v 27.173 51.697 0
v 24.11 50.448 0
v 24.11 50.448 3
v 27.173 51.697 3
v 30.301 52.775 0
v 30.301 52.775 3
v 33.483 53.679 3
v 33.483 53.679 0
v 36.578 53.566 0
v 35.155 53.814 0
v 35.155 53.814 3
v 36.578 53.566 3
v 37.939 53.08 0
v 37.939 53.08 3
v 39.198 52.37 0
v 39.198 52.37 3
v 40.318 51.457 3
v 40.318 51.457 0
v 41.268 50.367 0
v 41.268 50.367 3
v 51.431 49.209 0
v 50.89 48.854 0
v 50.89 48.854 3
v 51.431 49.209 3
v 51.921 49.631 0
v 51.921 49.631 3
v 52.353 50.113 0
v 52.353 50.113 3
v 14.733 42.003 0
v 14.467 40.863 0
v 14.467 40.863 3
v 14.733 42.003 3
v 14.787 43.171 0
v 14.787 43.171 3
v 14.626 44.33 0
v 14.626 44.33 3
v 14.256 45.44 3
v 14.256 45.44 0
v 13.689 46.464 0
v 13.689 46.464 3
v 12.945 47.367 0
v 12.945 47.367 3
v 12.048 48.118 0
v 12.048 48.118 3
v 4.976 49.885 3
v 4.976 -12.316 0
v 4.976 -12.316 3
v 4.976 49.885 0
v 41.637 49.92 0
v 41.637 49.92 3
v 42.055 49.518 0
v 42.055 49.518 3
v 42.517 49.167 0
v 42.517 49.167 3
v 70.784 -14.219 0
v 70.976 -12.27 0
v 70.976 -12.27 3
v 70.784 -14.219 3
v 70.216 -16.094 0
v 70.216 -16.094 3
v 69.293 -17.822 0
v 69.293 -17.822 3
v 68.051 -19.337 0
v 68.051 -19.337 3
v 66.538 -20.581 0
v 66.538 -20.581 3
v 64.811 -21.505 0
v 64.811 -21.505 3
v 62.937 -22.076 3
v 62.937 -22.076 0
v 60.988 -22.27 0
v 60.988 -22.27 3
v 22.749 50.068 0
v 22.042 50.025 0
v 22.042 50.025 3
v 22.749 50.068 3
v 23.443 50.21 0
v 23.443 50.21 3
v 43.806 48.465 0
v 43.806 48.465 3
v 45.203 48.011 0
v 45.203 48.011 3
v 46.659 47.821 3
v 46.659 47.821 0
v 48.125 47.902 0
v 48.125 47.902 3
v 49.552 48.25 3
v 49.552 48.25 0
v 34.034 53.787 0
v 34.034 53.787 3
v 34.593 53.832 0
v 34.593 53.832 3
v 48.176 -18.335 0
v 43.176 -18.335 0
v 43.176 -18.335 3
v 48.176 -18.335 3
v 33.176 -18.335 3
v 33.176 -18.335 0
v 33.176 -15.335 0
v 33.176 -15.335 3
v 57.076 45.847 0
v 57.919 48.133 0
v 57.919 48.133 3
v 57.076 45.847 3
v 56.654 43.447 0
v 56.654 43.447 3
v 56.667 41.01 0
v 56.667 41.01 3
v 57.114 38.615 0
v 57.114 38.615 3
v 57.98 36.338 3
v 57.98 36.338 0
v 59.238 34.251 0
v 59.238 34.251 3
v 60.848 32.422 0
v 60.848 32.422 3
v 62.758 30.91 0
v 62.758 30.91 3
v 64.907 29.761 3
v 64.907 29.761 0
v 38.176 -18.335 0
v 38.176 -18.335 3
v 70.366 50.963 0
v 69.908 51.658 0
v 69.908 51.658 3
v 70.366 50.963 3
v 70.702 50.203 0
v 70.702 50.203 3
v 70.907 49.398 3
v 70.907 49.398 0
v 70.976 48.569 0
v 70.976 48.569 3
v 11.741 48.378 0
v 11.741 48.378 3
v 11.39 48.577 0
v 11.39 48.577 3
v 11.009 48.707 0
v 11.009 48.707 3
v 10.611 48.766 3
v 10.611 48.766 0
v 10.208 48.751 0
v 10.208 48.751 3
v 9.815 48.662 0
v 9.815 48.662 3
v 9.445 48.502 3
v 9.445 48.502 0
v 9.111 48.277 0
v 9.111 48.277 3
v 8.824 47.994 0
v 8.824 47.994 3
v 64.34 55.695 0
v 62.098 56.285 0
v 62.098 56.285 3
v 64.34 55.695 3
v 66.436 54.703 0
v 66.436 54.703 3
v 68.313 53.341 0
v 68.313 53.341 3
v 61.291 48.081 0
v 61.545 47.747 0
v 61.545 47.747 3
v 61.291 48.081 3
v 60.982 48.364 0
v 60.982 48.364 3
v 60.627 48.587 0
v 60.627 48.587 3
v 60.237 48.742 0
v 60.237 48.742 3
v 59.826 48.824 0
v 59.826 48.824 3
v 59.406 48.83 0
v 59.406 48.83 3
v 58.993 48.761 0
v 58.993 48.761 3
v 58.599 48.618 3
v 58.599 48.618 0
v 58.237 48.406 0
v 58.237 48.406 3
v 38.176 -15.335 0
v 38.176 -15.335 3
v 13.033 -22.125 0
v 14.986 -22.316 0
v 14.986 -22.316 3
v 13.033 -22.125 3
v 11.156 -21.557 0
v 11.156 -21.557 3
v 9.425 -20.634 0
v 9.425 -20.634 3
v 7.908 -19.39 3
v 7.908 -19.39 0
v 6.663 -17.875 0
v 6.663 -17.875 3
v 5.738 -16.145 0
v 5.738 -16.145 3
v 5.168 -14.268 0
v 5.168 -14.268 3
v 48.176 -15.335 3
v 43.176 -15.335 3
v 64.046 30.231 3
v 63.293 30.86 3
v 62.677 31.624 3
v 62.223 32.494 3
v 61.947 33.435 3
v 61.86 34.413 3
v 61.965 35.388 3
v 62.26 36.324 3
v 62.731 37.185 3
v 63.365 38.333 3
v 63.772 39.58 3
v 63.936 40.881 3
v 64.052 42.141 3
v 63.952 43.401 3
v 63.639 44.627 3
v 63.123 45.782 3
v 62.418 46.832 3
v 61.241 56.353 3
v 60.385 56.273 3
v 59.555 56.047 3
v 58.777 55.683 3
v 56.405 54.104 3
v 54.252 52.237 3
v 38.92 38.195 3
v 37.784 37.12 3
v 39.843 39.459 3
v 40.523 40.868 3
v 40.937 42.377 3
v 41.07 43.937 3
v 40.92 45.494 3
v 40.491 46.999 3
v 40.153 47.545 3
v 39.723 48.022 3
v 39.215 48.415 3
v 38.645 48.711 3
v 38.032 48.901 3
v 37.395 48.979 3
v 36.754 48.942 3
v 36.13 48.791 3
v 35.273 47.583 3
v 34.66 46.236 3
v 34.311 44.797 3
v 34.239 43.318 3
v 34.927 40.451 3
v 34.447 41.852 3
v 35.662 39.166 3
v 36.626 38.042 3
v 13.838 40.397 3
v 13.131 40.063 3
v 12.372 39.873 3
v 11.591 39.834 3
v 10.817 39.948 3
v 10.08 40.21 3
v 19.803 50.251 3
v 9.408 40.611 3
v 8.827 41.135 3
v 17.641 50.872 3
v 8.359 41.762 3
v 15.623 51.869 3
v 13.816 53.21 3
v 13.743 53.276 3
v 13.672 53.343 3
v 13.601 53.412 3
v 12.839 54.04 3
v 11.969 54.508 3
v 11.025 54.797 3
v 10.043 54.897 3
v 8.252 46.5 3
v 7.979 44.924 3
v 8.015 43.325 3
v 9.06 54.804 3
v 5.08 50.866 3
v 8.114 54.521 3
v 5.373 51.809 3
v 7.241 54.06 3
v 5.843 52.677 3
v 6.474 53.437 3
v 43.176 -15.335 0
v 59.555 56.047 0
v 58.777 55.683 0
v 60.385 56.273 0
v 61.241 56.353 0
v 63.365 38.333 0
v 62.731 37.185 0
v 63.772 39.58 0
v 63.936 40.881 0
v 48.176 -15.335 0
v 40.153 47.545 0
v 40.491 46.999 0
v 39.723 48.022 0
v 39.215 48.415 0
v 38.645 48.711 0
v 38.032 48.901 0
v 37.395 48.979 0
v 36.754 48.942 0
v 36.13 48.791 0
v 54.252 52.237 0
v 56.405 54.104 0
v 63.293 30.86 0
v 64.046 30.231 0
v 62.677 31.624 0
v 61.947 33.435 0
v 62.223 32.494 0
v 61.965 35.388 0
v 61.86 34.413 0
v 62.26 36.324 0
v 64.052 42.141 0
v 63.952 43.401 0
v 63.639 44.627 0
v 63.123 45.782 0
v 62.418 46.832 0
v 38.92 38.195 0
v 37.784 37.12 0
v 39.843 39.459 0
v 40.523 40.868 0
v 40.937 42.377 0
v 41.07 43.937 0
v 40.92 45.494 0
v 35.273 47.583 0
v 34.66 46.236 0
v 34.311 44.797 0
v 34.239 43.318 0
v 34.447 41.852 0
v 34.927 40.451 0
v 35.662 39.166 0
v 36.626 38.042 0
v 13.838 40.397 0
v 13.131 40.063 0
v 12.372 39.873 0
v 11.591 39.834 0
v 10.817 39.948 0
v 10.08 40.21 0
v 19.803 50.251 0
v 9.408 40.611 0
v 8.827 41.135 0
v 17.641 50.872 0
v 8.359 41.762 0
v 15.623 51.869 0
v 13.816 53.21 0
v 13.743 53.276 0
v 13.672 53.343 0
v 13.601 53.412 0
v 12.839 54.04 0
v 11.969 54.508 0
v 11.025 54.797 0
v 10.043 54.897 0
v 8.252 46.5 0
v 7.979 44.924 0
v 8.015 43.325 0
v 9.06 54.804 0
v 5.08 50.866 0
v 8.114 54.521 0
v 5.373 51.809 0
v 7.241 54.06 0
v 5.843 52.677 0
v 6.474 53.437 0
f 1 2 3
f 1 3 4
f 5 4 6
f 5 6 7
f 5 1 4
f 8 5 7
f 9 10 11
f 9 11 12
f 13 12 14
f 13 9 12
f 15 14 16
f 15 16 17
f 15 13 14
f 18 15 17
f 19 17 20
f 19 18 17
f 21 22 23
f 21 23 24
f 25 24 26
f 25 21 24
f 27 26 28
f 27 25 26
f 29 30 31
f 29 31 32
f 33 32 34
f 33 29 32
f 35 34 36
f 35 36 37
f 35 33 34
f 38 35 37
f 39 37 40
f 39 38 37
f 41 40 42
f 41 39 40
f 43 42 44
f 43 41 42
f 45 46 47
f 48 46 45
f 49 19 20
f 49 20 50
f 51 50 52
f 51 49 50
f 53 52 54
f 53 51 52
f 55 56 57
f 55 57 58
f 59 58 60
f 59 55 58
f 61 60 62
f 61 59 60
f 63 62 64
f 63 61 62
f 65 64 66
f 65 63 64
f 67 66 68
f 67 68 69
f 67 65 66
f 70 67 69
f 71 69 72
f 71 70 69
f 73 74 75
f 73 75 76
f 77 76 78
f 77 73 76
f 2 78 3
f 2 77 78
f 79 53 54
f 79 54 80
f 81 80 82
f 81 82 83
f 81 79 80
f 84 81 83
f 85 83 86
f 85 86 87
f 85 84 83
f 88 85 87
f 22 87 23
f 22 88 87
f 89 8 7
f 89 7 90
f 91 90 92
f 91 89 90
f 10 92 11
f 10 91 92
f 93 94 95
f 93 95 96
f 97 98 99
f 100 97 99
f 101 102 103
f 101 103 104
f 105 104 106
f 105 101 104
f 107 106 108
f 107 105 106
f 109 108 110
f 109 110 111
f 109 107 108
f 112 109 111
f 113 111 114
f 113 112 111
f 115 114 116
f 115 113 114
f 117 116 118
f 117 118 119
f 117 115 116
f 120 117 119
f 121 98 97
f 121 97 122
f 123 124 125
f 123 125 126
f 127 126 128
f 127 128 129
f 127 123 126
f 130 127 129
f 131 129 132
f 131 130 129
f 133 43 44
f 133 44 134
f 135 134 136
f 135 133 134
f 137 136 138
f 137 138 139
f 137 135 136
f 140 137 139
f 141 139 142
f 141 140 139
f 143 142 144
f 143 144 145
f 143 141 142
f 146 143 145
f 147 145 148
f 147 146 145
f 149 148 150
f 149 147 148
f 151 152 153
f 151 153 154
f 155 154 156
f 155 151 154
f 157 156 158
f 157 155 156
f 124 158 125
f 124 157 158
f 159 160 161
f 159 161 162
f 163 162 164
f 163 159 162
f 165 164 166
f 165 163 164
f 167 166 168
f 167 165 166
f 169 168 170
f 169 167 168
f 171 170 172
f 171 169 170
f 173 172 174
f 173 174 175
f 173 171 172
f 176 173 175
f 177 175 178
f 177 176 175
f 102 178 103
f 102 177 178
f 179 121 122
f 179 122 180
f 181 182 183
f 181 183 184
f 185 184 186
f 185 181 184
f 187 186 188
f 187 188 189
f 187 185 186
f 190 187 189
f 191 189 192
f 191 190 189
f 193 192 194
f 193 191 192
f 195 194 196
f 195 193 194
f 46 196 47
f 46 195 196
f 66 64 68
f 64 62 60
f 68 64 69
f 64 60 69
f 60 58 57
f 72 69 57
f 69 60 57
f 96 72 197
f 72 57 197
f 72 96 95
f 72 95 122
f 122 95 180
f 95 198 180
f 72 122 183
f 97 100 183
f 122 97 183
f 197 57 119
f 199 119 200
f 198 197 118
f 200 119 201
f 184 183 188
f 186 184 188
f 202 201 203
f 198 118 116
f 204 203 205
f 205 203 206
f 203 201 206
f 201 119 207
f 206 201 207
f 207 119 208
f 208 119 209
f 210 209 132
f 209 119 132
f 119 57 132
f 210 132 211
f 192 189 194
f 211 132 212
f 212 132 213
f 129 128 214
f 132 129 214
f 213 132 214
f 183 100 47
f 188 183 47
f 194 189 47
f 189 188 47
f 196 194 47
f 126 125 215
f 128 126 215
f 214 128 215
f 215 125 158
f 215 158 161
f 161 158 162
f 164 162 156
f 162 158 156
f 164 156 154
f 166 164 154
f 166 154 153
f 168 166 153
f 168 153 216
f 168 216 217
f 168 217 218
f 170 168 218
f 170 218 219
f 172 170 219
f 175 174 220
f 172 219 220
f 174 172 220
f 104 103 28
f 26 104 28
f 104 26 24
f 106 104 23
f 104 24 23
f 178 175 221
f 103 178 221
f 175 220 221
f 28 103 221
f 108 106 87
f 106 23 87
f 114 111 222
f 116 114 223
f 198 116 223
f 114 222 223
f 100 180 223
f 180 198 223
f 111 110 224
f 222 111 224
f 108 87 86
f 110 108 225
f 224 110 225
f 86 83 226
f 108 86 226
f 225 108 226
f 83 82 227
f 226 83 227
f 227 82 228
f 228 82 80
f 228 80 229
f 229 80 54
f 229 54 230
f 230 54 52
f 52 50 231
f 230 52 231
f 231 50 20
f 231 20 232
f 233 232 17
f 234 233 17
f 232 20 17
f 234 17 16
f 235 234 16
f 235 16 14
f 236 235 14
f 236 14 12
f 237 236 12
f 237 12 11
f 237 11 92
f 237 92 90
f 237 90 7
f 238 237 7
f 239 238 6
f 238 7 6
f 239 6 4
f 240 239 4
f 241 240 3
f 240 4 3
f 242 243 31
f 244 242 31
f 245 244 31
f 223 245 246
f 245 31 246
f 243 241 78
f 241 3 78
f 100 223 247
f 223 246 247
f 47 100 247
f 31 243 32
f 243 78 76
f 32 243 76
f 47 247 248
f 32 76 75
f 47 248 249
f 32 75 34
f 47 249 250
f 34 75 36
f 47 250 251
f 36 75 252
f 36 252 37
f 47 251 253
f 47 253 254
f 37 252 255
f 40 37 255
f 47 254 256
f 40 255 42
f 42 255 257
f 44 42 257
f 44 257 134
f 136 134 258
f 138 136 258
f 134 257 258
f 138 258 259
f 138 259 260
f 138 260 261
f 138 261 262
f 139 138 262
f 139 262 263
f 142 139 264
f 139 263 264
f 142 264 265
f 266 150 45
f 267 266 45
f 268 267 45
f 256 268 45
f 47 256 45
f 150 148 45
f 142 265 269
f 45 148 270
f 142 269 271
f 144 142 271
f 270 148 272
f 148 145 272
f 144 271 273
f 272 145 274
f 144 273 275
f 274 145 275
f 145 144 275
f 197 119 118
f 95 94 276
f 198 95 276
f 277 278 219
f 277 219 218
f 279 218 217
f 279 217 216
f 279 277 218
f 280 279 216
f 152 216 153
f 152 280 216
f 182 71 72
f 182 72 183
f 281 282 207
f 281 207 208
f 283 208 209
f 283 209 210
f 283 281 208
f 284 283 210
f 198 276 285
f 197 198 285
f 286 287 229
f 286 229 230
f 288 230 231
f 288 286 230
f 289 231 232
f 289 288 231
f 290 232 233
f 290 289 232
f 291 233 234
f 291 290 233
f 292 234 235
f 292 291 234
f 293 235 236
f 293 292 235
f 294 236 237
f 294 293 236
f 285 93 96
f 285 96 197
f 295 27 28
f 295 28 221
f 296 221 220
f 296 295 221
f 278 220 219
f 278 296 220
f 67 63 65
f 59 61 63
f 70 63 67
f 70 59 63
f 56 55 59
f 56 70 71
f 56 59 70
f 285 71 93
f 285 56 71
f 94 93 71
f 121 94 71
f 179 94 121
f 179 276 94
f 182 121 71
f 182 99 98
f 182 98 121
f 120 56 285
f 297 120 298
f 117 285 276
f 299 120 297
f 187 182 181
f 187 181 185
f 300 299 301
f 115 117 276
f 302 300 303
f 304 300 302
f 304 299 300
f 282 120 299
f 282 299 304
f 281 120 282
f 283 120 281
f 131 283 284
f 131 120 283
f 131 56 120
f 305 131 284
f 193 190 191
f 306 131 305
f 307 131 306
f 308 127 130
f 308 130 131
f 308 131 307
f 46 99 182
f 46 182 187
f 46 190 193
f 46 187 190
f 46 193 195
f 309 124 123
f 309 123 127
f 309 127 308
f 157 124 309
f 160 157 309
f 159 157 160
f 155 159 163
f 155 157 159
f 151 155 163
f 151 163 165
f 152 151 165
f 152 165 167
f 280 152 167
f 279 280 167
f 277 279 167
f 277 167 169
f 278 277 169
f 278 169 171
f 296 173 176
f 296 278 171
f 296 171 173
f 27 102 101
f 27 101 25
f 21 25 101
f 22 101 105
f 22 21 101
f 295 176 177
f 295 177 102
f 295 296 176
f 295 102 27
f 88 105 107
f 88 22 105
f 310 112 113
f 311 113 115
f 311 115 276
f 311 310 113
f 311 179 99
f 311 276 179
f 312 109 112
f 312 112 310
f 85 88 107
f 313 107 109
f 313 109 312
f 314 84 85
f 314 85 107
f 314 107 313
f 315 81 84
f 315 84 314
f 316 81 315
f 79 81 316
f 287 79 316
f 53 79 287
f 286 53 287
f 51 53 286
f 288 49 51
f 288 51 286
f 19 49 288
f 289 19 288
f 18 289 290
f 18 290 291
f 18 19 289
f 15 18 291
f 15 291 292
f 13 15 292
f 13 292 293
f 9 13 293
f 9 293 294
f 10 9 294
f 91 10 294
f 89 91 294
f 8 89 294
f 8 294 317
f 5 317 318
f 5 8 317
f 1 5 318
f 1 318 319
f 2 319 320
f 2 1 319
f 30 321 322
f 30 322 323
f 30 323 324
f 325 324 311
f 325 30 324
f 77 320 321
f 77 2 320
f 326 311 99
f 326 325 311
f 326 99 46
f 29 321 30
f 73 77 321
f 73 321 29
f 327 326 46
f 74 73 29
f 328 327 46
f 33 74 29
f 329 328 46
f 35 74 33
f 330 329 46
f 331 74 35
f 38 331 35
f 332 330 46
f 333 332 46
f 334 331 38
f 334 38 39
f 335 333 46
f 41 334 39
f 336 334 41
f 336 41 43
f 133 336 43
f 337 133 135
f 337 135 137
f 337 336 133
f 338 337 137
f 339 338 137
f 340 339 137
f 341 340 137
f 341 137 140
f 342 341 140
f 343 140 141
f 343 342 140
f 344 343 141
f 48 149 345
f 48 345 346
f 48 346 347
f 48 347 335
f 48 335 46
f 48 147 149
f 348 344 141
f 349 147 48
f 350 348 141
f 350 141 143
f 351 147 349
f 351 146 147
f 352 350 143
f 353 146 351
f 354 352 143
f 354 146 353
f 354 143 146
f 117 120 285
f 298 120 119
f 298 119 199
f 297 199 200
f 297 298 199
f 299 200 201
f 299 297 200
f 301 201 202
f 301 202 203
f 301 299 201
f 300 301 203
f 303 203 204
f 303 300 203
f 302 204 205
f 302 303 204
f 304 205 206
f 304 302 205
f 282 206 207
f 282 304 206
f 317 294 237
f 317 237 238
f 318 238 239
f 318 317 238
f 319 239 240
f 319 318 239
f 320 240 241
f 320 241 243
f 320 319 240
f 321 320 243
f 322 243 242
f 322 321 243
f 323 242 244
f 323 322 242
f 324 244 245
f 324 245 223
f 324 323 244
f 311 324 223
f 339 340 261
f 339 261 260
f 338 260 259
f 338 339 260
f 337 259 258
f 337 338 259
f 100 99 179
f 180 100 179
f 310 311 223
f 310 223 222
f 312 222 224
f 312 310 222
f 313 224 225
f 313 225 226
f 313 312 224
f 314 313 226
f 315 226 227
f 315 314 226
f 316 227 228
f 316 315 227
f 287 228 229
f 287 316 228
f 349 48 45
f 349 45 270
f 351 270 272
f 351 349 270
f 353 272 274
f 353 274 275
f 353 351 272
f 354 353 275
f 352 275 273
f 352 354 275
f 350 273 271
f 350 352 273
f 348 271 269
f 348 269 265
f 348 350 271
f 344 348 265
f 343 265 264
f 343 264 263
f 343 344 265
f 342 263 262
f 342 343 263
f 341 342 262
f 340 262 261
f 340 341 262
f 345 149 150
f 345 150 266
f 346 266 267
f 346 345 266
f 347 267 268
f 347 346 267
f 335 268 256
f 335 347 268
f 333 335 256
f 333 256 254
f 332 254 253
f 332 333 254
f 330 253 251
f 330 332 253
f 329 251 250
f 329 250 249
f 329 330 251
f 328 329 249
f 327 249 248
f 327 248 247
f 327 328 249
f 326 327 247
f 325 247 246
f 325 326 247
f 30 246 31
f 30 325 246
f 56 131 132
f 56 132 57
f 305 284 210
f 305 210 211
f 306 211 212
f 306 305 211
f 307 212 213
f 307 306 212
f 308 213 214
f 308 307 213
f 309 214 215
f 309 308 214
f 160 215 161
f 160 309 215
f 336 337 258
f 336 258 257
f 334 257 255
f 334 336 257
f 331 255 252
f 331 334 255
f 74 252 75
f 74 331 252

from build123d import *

# Parameters (mm, degrees)
MODEL_W                 = 5
MODEL_H                 = 3
SALIENTE_EXTRUIR1_DEPTH = 3


with BuildPart() as part:
    # Model → Saliente-Extruir1 (new body)
    with BuildSketch(Plane.XY):
        with BuildLine():
            ThreePointArc((41.267867754, 50.3668743), (41.840038745, 49.712625685), (42.516862734, 49.167345775))
            ThreePointArc((42.516862734, 49.167345775), (46.658942321, 47.821013343), (50.890017113, 48.854183425))
            ThreePointArc((50.890017113, 48.854183425), (51.682739903, 49.412356399), (52.352838083, 50.113023882))
            ThreePointArc((52.352838083, 50.113023882), (55.298688256, 53.204742994), (58.776644321, 55.682762754))
            ThreePointArc((58.776644321, 55.682762754), (60.384709339, 56.272809284), (62.097562925, 56.285482302))
            ThreePointArc((62.097562925, 56.285482302), (66.436098934, 54.702702392), (69.908221839, 51.657632693))
            ThreePointArc((69.908221839, 51.657632693), (70.701503033, 50.2031837), (70.975974725, 48.569359286))
            Line((70.975974725, 48.569359286), (70.975974725, -12.270034891))
            ThreePointArc((70.975974725, -12.270034891), (68.051211593, -19.336931187), (60.987770072, -22.270027934))
            Line((60.987770072, -22.270027934), (14.985714259, -22.315810799))
            ThreePointArc((14.985714259, -22.315810799), (7.908350506, -19.39032634), (4.975973655, -12.315815543))
            Line((4.975973655, -12.315815543), (4.975973655, -2.813238517))
            Line((4.975973655, -2.813238517), (4.975973655, 40.425288245))
            Line((4.975973655, 40.425288245), (4.975973655, 49.884528276))
            ThreePointArc((4.975973655, 49.884528276), (8.113744062, 54.521049823), (13.601344724, 53.412368555))
            ThreePointArc((13.601344724, 53.412368555), (13.707091478, 53.309379729), (13.815832279, 53.209557326))
            ThreePointArc((13.815832279, 53.209557326), (17.640590842, 50.871877459), (22.042476183, 50.025159874))
            ThreePointArc((22.042476183, 50.025159874), (23.098925942, 50.126451448), (24.110198526, 50.448435664))
            ThreePointArc((24.110198526, 50.448435664), (28.729757377, 52.257521246), (33.482882411, 53.679110861))
            ThreePointArc((33.482882411, 53.679110861), (34.313026149, 53.81737559), (35.154600394, 53.814451111))
            ThreePointArc((35.154600394, 53.814451111), (38.583837662, 52.751366), (41.267867754, 50.3668743))
        make_face()
        with Locations((45.675973655, -16.835371011)):
            Rectangle(MODEL_W, MODEL_H, mode=Mode.SUBTRACT)
        with Locations((35.675973655, -16.835371011)):
            Rectangle(MODEL_W, MODEL_H, mode=Mode.SUBTRACT)
        with BuildLine():
            ThreePointArc((61.544611159, 47.747091698), (59.825660646, 48.823765634), (57.918666613, 48.13283048))
            ThreePointArc((57.918666613, 48.13283048), (57.495803013, 37.456958674), (64.907336248, 29.761360741))
            ThreePointArc((64.907336248, 29.761360741), (62.061503492, 32.95773428), (62.730808451, 37.184742531))
            ThreePointArc((62.730808451, 37.184742531), (63.597745225, 38.946667832), (63.936191604, 40.880941387))
            ThreePointArc((63.936191604, 40.880941387), (63.639107759, 44.627049101), (61.544611159, 47.747091698))
        make_face(mode=Mode.SUBTRACT)
        with BuildLine():
            ThreePointArc((37.783690328, 37.119649339), (40.764172897, 41.613475795), (40.490547933, 46.998908176))
            ThreePointArc((40.490547933, 46.998908176), (38.645359064, 48.710978233), (36.129518354, 48.791298643))
            ThreePointArc((36.129518354, 48.791298643), (34.308280563, 42.580138607), (37.783690328, 37.119649339))
        make_face(mode=Mode.SUBTRACT)
        with BuildLine():
            ThreePointArc((8.359011818, 41.762359599), (11.200768363, 39.871762064), (14.466790556, 40.863244963))
            ThreePointArc((14.466790556, 40.863244963), (14.466640554, 44.89370885), (12.048482223, 48.118169962))
            ThreePointArc((12.048482223, 48.118169962), (10.408906396, 48.767789115), (8.824071113, 47.99415415))
            ThreePointArc((8.824071113, 47.99415415), (7.978922821, 44.923974684), (8.359011818, 41.762359599))
        make_face(mode=Mode.SUBTRACT)
    extrude(amount=SALIENTE_EXTRUIR1_DEPTH)


solid = part.part
